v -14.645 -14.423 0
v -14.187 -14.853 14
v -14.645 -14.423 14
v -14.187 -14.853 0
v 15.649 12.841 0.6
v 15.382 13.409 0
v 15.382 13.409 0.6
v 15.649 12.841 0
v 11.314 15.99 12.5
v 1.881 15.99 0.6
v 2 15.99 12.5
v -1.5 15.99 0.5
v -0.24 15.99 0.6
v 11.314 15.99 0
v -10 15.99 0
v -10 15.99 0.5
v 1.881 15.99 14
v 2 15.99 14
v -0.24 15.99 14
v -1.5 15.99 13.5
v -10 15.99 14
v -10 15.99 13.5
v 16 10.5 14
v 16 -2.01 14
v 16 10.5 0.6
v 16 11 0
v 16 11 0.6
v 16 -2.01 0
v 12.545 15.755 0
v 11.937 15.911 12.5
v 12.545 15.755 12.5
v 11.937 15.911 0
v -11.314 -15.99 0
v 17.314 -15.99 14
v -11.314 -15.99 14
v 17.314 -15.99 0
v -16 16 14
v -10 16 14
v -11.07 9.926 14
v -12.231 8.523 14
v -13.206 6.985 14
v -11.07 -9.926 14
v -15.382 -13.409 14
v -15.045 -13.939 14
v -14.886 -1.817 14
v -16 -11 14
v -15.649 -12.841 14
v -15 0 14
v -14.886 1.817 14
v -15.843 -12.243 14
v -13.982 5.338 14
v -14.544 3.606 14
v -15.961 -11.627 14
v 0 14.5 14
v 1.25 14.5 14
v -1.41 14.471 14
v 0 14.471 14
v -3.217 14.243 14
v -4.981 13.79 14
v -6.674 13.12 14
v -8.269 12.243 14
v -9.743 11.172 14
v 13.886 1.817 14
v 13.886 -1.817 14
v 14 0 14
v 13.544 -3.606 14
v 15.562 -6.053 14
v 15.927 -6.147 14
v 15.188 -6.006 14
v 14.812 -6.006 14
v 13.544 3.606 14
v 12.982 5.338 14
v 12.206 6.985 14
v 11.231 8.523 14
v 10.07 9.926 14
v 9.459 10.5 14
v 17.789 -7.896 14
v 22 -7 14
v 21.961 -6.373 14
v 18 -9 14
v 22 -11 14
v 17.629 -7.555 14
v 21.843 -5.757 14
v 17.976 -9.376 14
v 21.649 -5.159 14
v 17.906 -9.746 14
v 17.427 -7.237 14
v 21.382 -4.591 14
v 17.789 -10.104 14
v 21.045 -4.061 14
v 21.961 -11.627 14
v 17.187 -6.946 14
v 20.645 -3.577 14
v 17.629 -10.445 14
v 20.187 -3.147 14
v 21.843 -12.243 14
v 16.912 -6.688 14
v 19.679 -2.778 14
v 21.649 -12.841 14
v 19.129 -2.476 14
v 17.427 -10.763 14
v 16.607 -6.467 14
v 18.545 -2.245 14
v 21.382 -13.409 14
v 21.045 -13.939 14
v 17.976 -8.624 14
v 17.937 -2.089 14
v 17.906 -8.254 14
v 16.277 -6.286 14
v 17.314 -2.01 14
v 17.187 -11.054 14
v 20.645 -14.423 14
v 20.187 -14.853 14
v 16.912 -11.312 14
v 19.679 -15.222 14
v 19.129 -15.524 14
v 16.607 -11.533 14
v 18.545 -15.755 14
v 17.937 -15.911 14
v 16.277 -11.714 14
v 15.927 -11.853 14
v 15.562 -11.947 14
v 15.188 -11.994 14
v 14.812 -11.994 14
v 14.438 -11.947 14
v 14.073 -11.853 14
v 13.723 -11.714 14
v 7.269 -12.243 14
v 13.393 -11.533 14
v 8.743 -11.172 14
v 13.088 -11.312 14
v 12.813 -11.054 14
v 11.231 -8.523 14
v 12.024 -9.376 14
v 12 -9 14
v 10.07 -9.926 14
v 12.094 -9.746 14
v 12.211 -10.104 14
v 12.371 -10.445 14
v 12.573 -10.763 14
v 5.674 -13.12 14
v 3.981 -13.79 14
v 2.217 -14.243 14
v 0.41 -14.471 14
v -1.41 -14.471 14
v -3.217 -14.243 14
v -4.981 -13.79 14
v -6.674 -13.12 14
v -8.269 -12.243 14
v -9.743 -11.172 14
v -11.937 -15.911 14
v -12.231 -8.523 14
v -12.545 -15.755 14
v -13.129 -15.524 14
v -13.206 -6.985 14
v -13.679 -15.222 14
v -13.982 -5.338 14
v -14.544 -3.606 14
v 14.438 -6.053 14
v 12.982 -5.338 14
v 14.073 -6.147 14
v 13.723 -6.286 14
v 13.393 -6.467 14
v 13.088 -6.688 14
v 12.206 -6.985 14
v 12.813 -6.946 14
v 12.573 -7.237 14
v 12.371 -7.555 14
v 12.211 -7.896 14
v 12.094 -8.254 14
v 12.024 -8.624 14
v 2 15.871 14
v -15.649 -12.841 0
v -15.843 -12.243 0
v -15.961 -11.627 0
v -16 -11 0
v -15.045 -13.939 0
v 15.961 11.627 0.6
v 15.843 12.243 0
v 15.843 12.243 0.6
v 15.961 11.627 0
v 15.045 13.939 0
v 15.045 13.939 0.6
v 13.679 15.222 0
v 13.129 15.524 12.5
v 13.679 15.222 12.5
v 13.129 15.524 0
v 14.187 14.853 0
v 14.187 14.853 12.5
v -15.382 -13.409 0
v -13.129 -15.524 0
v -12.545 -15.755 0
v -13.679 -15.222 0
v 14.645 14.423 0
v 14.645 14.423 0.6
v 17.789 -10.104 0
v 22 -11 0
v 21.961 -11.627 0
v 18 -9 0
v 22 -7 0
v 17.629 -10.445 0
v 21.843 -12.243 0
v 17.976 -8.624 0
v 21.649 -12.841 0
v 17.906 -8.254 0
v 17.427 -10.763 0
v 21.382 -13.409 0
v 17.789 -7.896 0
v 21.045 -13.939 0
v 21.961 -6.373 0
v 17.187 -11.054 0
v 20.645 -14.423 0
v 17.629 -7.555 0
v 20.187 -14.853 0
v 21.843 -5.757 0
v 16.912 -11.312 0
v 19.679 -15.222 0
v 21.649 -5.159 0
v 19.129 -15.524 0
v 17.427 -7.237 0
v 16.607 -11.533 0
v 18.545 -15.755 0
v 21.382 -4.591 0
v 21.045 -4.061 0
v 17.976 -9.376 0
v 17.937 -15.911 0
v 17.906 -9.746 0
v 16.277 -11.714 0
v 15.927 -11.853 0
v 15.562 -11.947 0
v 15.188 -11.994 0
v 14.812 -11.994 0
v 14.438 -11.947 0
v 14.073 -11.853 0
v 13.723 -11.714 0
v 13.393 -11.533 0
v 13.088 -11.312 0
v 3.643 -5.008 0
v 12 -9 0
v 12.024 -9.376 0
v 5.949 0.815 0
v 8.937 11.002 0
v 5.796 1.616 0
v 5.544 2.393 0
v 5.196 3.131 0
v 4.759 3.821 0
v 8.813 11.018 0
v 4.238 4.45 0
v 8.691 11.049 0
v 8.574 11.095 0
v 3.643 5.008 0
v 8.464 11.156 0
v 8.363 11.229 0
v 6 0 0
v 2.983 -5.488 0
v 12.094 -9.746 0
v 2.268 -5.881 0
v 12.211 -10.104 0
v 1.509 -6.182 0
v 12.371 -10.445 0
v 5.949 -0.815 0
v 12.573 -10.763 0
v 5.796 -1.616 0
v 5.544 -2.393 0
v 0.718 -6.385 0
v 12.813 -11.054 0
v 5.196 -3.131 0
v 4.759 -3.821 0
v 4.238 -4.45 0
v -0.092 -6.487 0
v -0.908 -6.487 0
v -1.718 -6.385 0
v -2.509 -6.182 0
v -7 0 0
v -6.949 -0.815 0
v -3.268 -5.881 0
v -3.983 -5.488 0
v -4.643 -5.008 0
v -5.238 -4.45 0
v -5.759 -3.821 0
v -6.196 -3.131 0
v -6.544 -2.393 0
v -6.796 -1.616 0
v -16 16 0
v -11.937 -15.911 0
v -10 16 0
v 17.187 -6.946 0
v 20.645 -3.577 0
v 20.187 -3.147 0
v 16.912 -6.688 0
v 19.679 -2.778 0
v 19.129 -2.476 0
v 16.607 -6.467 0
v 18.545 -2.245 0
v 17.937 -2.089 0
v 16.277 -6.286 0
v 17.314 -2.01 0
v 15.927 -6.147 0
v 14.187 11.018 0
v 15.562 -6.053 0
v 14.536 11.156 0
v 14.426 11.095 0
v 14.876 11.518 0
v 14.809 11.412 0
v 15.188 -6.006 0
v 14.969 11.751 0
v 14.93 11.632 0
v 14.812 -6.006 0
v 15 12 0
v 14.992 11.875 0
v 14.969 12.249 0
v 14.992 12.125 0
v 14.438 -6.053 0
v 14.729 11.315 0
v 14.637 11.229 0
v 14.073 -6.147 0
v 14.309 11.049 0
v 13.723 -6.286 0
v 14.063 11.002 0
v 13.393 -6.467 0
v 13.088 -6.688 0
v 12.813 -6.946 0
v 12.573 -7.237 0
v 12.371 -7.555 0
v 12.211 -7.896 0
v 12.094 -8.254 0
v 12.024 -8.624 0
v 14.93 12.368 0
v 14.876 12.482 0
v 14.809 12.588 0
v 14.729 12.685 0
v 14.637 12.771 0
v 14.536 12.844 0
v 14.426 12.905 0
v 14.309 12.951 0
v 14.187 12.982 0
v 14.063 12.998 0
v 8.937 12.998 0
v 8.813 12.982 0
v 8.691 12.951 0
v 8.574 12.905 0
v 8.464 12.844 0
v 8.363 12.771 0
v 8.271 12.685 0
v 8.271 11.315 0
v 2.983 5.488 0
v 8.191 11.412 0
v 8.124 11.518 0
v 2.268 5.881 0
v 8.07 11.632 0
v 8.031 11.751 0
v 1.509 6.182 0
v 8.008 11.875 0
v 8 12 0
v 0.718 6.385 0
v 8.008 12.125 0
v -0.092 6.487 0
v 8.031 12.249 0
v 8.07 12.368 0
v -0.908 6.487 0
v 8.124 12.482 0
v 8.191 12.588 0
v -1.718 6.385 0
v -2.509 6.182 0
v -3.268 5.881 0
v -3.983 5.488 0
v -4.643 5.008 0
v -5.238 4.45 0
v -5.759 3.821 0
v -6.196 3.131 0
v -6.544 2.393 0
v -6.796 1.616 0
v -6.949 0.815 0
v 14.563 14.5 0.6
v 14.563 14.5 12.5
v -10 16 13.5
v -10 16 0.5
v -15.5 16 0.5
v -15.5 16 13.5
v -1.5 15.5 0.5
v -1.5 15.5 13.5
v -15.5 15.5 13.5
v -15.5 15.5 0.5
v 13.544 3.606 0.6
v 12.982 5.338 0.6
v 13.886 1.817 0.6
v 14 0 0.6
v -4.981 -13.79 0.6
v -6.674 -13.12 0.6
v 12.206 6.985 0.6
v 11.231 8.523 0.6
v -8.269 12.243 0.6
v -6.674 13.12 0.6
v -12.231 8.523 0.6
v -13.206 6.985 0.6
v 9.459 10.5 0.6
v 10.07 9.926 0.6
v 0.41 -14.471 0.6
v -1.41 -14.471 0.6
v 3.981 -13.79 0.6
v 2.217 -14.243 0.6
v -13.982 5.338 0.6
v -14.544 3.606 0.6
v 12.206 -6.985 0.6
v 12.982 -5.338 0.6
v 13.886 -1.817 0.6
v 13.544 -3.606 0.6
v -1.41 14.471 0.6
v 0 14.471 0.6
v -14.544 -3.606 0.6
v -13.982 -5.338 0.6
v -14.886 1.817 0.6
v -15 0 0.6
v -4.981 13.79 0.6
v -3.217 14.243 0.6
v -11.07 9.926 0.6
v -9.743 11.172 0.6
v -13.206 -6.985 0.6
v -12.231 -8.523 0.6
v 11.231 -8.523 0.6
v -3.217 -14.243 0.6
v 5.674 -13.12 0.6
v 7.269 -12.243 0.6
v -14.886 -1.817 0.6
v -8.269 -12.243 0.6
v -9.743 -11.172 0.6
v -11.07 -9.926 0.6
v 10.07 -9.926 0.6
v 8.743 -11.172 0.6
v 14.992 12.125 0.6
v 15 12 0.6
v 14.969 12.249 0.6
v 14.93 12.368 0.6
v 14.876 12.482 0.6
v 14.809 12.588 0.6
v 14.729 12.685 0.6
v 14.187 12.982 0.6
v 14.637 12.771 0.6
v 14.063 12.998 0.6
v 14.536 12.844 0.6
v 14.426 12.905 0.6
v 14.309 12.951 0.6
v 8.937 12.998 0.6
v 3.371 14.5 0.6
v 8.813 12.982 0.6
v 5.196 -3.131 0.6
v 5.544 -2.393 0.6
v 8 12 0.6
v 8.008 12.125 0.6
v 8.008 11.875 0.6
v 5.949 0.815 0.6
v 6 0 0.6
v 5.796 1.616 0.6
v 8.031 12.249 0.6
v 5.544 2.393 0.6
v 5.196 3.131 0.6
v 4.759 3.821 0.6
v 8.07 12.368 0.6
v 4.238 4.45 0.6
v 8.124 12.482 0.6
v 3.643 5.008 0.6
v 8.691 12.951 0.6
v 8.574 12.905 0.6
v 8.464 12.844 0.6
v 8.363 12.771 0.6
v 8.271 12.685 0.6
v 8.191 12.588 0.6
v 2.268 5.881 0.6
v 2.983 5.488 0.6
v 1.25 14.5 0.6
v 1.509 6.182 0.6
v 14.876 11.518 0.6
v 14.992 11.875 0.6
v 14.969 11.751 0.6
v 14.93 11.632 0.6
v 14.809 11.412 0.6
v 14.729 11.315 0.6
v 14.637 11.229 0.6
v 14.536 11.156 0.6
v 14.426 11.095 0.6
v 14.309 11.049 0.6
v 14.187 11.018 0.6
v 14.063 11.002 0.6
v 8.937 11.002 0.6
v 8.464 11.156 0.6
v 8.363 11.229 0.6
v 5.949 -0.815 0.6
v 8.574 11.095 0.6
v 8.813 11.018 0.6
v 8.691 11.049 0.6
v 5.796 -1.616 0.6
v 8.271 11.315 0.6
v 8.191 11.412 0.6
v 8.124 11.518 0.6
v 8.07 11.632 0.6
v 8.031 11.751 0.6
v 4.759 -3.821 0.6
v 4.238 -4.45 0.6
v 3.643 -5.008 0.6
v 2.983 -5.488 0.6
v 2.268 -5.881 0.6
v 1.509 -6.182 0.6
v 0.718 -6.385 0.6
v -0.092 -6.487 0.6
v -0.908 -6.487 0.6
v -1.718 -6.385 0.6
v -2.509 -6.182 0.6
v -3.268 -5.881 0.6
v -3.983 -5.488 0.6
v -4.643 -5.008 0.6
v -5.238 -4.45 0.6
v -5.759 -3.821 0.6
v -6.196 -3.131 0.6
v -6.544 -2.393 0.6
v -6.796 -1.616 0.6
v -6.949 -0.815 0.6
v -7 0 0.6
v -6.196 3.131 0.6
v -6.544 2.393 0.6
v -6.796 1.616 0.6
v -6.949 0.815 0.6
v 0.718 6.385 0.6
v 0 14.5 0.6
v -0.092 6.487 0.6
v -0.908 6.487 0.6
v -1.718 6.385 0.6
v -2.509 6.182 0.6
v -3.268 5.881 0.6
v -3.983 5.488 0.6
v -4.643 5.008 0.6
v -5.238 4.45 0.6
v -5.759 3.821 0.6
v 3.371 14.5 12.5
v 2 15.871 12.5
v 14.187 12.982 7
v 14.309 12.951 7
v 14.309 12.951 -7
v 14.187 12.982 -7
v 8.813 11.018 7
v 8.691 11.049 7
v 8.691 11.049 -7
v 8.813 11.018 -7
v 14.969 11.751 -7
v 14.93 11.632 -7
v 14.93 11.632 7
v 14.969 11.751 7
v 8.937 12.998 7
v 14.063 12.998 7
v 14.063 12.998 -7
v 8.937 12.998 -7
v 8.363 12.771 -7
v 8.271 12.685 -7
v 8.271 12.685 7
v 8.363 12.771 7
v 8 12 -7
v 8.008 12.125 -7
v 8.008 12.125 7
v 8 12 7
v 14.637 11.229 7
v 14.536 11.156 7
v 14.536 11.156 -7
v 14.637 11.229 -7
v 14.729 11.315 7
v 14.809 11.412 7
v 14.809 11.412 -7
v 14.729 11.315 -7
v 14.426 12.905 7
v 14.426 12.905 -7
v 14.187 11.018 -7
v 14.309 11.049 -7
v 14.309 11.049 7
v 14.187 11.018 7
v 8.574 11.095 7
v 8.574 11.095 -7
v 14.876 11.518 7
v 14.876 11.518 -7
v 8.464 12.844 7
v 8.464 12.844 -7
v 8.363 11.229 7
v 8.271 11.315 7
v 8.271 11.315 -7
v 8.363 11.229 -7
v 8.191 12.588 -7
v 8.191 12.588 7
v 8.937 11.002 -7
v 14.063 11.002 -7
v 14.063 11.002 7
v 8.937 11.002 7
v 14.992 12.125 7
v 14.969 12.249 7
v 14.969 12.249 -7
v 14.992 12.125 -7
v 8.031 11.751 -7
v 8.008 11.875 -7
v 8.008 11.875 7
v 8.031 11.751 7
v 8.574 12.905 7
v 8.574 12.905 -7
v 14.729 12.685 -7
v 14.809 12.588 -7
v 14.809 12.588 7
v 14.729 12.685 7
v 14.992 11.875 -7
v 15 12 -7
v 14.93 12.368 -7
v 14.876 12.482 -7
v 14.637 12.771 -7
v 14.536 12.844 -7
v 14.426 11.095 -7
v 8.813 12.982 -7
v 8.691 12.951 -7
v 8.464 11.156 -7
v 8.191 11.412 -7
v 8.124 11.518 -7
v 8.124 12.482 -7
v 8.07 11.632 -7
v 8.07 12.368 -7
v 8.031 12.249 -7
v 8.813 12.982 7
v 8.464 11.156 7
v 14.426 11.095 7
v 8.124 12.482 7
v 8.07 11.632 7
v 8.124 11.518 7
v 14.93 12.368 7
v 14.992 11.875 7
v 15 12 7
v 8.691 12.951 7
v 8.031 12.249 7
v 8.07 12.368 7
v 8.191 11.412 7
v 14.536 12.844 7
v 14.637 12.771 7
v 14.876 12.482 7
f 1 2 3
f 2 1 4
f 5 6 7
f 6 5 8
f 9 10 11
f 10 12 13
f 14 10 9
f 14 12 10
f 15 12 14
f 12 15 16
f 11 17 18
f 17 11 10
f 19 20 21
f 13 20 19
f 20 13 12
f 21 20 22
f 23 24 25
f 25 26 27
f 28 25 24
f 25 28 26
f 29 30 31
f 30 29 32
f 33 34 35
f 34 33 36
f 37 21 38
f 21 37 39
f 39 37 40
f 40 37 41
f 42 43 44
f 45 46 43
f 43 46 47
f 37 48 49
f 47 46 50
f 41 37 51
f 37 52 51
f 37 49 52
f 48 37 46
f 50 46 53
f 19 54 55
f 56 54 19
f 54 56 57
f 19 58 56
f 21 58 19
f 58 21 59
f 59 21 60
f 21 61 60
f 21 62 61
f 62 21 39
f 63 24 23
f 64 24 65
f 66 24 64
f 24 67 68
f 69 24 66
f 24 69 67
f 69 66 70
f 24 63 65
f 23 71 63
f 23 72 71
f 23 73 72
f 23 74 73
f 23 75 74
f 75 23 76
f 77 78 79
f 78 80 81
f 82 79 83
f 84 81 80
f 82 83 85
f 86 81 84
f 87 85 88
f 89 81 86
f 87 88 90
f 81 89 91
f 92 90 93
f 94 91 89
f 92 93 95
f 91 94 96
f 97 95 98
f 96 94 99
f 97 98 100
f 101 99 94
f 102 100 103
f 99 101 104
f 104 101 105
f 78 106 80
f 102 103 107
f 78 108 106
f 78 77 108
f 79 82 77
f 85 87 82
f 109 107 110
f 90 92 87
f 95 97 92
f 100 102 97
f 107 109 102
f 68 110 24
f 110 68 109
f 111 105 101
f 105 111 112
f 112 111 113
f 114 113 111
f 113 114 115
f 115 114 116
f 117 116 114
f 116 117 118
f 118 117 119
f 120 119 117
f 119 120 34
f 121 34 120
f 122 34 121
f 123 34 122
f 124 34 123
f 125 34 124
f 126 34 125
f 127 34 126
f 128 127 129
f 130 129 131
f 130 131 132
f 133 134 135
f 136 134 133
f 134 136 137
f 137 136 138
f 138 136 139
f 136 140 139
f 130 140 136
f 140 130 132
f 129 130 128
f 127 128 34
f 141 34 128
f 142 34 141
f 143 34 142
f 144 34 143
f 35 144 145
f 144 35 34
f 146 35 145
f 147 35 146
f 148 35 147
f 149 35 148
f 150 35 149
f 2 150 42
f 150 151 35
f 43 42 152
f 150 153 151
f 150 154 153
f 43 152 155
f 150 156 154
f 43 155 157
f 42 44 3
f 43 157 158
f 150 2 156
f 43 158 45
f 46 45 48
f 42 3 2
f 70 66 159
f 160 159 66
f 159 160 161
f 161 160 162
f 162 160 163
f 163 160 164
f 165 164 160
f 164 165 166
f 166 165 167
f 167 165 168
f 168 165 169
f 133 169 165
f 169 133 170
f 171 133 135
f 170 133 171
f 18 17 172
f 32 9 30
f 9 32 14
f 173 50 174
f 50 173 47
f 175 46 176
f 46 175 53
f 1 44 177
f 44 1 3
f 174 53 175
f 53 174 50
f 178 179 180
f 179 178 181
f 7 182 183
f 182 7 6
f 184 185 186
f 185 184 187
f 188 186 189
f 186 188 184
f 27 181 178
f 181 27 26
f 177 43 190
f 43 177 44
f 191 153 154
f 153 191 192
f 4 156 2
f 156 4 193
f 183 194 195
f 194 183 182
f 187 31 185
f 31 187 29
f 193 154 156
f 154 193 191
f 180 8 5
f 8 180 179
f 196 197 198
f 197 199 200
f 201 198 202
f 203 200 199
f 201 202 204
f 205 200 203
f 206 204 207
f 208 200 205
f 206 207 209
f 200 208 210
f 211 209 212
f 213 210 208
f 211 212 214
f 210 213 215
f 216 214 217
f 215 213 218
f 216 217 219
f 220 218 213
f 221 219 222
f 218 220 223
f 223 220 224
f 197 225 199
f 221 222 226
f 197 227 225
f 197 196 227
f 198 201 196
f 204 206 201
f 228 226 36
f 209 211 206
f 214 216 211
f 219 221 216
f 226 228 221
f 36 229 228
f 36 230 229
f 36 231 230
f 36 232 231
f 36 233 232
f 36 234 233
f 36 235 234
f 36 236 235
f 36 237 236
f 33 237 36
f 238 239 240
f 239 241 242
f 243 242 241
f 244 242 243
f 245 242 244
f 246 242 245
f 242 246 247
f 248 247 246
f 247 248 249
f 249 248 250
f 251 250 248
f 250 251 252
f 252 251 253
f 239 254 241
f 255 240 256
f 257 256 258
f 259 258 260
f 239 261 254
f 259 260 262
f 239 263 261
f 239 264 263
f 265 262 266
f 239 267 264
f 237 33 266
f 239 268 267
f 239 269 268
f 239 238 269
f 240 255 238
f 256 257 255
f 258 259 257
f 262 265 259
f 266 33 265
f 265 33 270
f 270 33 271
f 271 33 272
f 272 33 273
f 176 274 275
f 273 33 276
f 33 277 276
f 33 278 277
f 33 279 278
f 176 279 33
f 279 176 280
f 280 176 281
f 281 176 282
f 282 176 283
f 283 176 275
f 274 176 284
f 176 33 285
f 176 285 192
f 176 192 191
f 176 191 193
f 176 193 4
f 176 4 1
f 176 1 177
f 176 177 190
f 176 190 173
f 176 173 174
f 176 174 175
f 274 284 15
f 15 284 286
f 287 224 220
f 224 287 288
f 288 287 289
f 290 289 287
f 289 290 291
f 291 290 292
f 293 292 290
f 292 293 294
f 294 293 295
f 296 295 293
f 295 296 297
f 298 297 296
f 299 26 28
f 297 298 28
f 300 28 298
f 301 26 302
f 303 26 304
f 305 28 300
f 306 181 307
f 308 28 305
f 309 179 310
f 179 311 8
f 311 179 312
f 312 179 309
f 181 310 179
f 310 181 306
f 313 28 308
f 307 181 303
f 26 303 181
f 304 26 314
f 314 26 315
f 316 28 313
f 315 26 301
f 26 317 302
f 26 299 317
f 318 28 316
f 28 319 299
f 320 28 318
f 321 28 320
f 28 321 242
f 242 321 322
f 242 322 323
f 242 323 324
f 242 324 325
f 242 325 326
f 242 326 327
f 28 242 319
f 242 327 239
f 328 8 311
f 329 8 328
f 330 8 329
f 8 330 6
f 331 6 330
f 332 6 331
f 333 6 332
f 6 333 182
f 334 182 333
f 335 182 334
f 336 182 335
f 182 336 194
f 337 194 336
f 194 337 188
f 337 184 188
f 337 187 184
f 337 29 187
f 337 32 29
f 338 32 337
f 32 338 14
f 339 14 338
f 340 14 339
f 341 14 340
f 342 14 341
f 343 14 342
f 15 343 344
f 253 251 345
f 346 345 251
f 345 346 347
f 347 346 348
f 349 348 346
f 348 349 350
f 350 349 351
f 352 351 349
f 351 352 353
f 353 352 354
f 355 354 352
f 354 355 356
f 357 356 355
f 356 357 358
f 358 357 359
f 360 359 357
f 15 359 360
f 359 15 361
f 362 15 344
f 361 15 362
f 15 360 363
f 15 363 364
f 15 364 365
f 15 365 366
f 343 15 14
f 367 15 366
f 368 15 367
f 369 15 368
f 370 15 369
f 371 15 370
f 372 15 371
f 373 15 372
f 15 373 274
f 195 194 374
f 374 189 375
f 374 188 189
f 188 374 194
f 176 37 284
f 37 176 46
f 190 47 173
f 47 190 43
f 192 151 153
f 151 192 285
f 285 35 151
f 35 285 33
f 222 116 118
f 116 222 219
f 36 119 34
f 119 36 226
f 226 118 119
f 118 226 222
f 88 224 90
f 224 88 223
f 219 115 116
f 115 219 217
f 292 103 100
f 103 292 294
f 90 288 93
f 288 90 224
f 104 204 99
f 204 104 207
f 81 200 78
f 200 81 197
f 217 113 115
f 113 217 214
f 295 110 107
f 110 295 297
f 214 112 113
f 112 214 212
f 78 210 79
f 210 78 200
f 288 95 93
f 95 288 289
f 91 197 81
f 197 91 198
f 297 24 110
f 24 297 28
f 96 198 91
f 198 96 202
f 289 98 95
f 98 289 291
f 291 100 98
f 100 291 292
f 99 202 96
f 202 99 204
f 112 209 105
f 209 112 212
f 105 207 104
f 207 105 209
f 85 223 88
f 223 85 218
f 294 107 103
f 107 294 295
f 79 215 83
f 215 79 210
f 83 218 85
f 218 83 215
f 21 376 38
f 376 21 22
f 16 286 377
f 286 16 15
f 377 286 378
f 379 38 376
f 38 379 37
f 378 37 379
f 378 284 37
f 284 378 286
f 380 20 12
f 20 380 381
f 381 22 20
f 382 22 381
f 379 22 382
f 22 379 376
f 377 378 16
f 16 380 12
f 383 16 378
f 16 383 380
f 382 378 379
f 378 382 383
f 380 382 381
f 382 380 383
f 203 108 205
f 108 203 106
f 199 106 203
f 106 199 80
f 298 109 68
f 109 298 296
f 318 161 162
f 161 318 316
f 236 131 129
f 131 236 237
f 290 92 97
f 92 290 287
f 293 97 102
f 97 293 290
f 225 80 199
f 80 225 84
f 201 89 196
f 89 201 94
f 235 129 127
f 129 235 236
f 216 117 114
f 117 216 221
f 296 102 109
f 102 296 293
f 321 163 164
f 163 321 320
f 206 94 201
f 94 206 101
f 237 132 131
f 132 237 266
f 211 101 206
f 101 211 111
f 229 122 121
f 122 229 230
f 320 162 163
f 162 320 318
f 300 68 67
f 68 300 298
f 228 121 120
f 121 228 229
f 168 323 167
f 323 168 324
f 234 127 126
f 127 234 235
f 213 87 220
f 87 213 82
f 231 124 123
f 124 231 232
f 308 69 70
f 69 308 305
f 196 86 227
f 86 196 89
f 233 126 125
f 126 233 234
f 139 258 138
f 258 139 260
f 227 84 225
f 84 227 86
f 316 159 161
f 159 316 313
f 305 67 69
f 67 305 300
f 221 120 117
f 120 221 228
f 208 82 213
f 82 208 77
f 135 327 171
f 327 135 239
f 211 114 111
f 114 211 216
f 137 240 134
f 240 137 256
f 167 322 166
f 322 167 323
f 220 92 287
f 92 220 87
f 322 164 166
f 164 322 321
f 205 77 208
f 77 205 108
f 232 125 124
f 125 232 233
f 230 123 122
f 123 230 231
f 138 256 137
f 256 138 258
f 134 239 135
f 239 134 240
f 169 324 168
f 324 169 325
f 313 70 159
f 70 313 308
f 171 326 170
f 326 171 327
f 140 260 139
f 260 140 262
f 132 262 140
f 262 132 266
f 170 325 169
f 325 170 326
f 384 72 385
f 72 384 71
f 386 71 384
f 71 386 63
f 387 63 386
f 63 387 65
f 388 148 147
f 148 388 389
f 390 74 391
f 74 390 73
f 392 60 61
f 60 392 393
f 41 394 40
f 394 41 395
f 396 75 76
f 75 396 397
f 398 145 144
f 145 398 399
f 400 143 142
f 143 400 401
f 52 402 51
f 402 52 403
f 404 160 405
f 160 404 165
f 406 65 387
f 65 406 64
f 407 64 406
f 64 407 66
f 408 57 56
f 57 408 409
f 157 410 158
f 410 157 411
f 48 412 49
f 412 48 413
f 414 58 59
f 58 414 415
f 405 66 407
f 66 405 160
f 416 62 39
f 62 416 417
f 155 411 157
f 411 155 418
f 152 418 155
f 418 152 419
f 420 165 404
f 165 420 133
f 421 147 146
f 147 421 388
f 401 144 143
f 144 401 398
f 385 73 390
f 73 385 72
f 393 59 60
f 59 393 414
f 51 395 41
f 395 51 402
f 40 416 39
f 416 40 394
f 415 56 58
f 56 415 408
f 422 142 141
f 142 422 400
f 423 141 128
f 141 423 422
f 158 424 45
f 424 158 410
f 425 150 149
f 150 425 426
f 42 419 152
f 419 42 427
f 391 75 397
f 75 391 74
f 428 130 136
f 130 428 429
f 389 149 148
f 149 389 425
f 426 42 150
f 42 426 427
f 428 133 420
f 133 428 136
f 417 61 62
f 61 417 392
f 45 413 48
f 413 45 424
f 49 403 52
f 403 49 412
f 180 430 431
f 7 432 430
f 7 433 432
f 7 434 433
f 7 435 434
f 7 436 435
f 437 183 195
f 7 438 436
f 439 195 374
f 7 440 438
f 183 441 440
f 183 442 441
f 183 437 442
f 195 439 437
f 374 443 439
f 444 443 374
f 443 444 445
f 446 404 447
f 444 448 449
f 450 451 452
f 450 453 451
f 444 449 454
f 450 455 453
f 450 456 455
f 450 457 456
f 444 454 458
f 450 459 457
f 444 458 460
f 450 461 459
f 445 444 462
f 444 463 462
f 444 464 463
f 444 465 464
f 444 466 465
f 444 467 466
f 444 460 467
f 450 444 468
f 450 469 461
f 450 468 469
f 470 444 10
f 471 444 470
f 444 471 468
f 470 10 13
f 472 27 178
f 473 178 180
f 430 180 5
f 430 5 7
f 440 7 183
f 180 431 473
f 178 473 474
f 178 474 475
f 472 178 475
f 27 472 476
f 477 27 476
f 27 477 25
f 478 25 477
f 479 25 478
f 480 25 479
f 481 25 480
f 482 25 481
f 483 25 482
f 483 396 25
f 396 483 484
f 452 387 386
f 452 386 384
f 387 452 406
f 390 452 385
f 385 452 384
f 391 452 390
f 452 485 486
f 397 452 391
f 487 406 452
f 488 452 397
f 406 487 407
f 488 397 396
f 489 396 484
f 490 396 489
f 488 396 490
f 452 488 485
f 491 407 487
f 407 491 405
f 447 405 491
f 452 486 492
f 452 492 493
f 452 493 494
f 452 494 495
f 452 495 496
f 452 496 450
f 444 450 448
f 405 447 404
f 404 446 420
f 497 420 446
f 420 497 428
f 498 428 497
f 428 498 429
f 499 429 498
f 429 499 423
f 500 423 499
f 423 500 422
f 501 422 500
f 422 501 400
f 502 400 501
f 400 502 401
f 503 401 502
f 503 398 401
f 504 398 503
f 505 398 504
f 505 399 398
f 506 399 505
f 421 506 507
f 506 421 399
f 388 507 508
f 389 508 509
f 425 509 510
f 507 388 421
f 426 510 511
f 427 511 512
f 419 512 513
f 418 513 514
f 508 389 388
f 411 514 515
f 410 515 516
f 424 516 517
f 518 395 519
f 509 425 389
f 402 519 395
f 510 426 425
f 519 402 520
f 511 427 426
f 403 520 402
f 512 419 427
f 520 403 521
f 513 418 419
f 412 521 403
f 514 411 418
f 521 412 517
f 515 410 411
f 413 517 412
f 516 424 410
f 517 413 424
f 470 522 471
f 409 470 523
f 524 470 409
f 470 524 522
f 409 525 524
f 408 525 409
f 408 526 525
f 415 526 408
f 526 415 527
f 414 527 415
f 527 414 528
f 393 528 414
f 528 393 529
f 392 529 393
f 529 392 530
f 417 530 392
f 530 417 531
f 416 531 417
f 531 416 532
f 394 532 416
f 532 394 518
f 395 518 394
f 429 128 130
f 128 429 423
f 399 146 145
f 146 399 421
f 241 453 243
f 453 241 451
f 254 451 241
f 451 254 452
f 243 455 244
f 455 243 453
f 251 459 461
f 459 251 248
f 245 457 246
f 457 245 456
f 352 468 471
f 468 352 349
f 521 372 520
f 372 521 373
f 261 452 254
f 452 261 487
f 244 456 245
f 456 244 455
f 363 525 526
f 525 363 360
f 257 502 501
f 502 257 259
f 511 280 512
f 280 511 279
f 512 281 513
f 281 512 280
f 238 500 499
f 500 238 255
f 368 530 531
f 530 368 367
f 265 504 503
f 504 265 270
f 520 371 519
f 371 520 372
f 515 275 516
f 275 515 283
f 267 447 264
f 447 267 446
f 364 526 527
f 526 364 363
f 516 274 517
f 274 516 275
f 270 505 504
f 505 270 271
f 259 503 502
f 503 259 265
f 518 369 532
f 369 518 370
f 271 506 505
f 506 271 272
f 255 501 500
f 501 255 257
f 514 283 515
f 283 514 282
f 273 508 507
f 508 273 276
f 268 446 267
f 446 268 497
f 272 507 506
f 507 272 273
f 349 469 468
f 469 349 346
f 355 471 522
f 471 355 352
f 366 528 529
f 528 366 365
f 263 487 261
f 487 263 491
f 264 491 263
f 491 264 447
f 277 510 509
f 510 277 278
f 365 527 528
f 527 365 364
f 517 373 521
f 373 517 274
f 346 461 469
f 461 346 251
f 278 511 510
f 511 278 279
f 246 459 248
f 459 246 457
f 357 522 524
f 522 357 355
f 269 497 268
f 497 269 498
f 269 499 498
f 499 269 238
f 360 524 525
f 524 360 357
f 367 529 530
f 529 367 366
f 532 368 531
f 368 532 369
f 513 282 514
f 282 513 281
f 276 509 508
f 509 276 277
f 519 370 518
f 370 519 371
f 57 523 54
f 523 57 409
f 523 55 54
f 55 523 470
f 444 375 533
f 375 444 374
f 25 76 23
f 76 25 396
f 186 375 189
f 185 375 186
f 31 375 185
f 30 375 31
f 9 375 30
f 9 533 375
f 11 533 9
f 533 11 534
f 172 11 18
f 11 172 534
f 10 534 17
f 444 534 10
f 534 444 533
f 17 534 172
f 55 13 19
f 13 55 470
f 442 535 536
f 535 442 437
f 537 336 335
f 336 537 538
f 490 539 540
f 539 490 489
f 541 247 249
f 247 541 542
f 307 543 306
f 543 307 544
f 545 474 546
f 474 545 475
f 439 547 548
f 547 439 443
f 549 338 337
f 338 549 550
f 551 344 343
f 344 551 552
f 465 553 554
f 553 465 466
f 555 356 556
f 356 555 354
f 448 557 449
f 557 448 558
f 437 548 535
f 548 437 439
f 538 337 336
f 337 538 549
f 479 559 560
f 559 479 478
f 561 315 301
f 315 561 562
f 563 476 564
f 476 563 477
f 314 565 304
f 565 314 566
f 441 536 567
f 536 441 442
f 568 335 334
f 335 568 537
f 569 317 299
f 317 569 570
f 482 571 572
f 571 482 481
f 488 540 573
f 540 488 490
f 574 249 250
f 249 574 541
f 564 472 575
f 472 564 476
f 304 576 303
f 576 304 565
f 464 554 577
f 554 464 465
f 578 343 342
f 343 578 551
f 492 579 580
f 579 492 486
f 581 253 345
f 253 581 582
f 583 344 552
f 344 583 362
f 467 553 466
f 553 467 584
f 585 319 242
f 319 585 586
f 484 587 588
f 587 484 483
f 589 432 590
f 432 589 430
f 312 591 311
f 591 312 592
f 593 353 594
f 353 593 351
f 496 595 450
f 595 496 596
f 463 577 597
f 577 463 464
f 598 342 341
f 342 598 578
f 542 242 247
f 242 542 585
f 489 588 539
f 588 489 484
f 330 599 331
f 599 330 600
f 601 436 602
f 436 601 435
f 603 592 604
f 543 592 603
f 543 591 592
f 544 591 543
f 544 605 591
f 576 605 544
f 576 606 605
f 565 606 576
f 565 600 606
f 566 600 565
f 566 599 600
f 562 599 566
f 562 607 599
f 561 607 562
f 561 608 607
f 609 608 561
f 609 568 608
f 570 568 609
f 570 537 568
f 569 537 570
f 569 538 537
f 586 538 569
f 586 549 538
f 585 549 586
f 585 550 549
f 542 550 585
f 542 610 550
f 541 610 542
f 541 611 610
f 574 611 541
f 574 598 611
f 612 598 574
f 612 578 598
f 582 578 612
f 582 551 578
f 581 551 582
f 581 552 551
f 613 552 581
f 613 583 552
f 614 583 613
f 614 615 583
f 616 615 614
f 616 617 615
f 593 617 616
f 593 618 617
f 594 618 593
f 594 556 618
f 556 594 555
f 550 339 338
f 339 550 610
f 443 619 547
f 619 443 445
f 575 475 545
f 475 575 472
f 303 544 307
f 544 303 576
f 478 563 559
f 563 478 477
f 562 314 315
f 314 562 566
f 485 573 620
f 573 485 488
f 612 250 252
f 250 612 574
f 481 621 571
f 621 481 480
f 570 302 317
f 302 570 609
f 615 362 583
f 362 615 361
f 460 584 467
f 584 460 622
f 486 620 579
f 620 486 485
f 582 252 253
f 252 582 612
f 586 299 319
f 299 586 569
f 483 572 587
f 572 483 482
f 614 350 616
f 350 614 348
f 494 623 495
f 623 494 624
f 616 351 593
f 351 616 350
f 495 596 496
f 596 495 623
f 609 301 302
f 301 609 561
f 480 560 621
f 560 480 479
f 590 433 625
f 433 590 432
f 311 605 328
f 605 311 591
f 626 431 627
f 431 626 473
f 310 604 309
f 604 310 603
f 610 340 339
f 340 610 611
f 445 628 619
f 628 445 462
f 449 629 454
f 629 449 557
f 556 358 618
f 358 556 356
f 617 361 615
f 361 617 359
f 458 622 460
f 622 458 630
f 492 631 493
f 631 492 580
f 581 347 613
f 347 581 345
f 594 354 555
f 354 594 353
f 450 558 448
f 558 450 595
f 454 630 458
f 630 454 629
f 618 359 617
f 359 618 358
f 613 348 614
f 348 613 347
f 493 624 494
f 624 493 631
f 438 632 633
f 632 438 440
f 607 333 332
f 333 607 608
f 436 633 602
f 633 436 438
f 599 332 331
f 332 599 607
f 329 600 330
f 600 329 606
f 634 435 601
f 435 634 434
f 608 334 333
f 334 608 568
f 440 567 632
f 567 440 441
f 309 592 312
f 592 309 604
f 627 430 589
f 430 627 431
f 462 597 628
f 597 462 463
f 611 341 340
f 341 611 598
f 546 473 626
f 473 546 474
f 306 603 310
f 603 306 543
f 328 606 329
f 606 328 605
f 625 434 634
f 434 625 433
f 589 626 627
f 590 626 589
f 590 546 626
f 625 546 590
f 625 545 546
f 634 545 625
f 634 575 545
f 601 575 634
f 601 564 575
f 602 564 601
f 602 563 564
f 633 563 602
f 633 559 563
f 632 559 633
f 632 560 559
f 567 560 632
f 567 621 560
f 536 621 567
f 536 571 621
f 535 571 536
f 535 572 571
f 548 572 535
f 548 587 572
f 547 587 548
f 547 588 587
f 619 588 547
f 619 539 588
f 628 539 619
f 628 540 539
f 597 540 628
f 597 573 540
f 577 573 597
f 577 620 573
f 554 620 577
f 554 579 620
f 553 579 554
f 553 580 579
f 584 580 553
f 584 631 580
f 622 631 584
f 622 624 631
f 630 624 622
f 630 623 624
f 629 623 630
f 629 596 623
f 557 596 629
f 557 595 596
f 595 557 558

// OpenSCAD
$fn = 50;


union() {
	difference() {
		union() {
			hull() {
				translate(v = [-11.0000000000, 11.0000000000, 0]) {
					cylinder(h = 14, r = 5);
				}
				translate(v = [11.0000000000, 11.0000000000, 0]) {
					cylinder(h = 14, r = 5);
				}
				translate(v = [-11.0000000000, -11.0000000000, 0]) {
					cylinder(h = 14, r = 5);
				}
				translate(v = [11.0000000000, -11.0000000000, 0]) {
					cylinder(h = 14, r = 5);
				}
			}
			translate(v = [7.5000000000, -9.0000000000, 0]) {
				hull() {
					translate(v = [-9.5000000000, 2.0000000000, 0]) {
						cylinder(h = 14, r = 5);
					}
					translate(v = [9.5000000000, 2.0000000000, 0]) {
						cylinder(h = 14, r = 5);
					}
					translate(v = [-9.5000000000, -2.0000000000, 0]) {
						cylinder(h = 14, r = 5);
					}
					translate(v = [9.5000000000, -2.0000000000, 0]) {
						cylinder(h = 14, r = 5);
					}
				}
			}
			translate(v = [-16.0000000000, 10.0000000000, 0]) {
				cube(size = [6, 6, 14]);
			}
		}
		union() {
			translate(v = [-15.5000000000, 15.5000000000, 0.5000000000]) {
				cube(size = [14, 0.5000000000, 13.0000000000]);
			}
			translate(v = [15.0000000000, -9.0000000000, -100.0000000000]) {
				cylinder(h = 200, r = 3.0000000000);
			}
			translate(v = [-0.5000000000, 0.0000000000, 0.6000000000]) {
				cylinder(h = 16.4000000000, r = 14.5000000000);
			}
			translate(v = [-0.5000000000, 0.0000000000, -7.0000000000]) {
				cylinder(h = 14, r = 6.5000000000);
			}
			translate(v = [0.0000000000, 10.5000000000, 0.6000000000]) {
				cube(size = [16.0000000000, 4, 16.4000000000]);
			}
			translate(v = [2.0000000000, 10.5000000000, 12.5000000000]) {
				cube(size = [14.0000000000, 7, 1.5000000000]);
			}
			translate(v = [-3.0000000000, 18.7500000000, 0.6000000000]) {
				rotate(a = [0, 0, -45]) {
					cube(size = [10, 1.5000000000, 16.4000000000]);
				}
			}
			translate(v = [2.2500000000, 11.0000000000, 0.6000000000]) {
				cube(size = [7.5000000000, 2, 13.4000000000]);
			}
		}
	}
	union() {
		translate(v = [11.5000000000, 12, -7.0000000000]) {
			rotate(a = [0, 0, 0]) {
				difference() {
					union() {
						hull() {
							translate(v = [2.5000000000, 0, 0]) {
								cylinder(h = 14, r = 1.0000000000, r1 = 1.0000000000, r2 = 1.0000000000);
							}
							translate(v = [-2.5000000000, 0, 0]) {
								cylinder(h = 14, r = 1.0000000000, r1 = 1.0000000000, r2 = 1.0000000000);
							}
						}
					}
					union();
				}
			}
		}
	}
}
